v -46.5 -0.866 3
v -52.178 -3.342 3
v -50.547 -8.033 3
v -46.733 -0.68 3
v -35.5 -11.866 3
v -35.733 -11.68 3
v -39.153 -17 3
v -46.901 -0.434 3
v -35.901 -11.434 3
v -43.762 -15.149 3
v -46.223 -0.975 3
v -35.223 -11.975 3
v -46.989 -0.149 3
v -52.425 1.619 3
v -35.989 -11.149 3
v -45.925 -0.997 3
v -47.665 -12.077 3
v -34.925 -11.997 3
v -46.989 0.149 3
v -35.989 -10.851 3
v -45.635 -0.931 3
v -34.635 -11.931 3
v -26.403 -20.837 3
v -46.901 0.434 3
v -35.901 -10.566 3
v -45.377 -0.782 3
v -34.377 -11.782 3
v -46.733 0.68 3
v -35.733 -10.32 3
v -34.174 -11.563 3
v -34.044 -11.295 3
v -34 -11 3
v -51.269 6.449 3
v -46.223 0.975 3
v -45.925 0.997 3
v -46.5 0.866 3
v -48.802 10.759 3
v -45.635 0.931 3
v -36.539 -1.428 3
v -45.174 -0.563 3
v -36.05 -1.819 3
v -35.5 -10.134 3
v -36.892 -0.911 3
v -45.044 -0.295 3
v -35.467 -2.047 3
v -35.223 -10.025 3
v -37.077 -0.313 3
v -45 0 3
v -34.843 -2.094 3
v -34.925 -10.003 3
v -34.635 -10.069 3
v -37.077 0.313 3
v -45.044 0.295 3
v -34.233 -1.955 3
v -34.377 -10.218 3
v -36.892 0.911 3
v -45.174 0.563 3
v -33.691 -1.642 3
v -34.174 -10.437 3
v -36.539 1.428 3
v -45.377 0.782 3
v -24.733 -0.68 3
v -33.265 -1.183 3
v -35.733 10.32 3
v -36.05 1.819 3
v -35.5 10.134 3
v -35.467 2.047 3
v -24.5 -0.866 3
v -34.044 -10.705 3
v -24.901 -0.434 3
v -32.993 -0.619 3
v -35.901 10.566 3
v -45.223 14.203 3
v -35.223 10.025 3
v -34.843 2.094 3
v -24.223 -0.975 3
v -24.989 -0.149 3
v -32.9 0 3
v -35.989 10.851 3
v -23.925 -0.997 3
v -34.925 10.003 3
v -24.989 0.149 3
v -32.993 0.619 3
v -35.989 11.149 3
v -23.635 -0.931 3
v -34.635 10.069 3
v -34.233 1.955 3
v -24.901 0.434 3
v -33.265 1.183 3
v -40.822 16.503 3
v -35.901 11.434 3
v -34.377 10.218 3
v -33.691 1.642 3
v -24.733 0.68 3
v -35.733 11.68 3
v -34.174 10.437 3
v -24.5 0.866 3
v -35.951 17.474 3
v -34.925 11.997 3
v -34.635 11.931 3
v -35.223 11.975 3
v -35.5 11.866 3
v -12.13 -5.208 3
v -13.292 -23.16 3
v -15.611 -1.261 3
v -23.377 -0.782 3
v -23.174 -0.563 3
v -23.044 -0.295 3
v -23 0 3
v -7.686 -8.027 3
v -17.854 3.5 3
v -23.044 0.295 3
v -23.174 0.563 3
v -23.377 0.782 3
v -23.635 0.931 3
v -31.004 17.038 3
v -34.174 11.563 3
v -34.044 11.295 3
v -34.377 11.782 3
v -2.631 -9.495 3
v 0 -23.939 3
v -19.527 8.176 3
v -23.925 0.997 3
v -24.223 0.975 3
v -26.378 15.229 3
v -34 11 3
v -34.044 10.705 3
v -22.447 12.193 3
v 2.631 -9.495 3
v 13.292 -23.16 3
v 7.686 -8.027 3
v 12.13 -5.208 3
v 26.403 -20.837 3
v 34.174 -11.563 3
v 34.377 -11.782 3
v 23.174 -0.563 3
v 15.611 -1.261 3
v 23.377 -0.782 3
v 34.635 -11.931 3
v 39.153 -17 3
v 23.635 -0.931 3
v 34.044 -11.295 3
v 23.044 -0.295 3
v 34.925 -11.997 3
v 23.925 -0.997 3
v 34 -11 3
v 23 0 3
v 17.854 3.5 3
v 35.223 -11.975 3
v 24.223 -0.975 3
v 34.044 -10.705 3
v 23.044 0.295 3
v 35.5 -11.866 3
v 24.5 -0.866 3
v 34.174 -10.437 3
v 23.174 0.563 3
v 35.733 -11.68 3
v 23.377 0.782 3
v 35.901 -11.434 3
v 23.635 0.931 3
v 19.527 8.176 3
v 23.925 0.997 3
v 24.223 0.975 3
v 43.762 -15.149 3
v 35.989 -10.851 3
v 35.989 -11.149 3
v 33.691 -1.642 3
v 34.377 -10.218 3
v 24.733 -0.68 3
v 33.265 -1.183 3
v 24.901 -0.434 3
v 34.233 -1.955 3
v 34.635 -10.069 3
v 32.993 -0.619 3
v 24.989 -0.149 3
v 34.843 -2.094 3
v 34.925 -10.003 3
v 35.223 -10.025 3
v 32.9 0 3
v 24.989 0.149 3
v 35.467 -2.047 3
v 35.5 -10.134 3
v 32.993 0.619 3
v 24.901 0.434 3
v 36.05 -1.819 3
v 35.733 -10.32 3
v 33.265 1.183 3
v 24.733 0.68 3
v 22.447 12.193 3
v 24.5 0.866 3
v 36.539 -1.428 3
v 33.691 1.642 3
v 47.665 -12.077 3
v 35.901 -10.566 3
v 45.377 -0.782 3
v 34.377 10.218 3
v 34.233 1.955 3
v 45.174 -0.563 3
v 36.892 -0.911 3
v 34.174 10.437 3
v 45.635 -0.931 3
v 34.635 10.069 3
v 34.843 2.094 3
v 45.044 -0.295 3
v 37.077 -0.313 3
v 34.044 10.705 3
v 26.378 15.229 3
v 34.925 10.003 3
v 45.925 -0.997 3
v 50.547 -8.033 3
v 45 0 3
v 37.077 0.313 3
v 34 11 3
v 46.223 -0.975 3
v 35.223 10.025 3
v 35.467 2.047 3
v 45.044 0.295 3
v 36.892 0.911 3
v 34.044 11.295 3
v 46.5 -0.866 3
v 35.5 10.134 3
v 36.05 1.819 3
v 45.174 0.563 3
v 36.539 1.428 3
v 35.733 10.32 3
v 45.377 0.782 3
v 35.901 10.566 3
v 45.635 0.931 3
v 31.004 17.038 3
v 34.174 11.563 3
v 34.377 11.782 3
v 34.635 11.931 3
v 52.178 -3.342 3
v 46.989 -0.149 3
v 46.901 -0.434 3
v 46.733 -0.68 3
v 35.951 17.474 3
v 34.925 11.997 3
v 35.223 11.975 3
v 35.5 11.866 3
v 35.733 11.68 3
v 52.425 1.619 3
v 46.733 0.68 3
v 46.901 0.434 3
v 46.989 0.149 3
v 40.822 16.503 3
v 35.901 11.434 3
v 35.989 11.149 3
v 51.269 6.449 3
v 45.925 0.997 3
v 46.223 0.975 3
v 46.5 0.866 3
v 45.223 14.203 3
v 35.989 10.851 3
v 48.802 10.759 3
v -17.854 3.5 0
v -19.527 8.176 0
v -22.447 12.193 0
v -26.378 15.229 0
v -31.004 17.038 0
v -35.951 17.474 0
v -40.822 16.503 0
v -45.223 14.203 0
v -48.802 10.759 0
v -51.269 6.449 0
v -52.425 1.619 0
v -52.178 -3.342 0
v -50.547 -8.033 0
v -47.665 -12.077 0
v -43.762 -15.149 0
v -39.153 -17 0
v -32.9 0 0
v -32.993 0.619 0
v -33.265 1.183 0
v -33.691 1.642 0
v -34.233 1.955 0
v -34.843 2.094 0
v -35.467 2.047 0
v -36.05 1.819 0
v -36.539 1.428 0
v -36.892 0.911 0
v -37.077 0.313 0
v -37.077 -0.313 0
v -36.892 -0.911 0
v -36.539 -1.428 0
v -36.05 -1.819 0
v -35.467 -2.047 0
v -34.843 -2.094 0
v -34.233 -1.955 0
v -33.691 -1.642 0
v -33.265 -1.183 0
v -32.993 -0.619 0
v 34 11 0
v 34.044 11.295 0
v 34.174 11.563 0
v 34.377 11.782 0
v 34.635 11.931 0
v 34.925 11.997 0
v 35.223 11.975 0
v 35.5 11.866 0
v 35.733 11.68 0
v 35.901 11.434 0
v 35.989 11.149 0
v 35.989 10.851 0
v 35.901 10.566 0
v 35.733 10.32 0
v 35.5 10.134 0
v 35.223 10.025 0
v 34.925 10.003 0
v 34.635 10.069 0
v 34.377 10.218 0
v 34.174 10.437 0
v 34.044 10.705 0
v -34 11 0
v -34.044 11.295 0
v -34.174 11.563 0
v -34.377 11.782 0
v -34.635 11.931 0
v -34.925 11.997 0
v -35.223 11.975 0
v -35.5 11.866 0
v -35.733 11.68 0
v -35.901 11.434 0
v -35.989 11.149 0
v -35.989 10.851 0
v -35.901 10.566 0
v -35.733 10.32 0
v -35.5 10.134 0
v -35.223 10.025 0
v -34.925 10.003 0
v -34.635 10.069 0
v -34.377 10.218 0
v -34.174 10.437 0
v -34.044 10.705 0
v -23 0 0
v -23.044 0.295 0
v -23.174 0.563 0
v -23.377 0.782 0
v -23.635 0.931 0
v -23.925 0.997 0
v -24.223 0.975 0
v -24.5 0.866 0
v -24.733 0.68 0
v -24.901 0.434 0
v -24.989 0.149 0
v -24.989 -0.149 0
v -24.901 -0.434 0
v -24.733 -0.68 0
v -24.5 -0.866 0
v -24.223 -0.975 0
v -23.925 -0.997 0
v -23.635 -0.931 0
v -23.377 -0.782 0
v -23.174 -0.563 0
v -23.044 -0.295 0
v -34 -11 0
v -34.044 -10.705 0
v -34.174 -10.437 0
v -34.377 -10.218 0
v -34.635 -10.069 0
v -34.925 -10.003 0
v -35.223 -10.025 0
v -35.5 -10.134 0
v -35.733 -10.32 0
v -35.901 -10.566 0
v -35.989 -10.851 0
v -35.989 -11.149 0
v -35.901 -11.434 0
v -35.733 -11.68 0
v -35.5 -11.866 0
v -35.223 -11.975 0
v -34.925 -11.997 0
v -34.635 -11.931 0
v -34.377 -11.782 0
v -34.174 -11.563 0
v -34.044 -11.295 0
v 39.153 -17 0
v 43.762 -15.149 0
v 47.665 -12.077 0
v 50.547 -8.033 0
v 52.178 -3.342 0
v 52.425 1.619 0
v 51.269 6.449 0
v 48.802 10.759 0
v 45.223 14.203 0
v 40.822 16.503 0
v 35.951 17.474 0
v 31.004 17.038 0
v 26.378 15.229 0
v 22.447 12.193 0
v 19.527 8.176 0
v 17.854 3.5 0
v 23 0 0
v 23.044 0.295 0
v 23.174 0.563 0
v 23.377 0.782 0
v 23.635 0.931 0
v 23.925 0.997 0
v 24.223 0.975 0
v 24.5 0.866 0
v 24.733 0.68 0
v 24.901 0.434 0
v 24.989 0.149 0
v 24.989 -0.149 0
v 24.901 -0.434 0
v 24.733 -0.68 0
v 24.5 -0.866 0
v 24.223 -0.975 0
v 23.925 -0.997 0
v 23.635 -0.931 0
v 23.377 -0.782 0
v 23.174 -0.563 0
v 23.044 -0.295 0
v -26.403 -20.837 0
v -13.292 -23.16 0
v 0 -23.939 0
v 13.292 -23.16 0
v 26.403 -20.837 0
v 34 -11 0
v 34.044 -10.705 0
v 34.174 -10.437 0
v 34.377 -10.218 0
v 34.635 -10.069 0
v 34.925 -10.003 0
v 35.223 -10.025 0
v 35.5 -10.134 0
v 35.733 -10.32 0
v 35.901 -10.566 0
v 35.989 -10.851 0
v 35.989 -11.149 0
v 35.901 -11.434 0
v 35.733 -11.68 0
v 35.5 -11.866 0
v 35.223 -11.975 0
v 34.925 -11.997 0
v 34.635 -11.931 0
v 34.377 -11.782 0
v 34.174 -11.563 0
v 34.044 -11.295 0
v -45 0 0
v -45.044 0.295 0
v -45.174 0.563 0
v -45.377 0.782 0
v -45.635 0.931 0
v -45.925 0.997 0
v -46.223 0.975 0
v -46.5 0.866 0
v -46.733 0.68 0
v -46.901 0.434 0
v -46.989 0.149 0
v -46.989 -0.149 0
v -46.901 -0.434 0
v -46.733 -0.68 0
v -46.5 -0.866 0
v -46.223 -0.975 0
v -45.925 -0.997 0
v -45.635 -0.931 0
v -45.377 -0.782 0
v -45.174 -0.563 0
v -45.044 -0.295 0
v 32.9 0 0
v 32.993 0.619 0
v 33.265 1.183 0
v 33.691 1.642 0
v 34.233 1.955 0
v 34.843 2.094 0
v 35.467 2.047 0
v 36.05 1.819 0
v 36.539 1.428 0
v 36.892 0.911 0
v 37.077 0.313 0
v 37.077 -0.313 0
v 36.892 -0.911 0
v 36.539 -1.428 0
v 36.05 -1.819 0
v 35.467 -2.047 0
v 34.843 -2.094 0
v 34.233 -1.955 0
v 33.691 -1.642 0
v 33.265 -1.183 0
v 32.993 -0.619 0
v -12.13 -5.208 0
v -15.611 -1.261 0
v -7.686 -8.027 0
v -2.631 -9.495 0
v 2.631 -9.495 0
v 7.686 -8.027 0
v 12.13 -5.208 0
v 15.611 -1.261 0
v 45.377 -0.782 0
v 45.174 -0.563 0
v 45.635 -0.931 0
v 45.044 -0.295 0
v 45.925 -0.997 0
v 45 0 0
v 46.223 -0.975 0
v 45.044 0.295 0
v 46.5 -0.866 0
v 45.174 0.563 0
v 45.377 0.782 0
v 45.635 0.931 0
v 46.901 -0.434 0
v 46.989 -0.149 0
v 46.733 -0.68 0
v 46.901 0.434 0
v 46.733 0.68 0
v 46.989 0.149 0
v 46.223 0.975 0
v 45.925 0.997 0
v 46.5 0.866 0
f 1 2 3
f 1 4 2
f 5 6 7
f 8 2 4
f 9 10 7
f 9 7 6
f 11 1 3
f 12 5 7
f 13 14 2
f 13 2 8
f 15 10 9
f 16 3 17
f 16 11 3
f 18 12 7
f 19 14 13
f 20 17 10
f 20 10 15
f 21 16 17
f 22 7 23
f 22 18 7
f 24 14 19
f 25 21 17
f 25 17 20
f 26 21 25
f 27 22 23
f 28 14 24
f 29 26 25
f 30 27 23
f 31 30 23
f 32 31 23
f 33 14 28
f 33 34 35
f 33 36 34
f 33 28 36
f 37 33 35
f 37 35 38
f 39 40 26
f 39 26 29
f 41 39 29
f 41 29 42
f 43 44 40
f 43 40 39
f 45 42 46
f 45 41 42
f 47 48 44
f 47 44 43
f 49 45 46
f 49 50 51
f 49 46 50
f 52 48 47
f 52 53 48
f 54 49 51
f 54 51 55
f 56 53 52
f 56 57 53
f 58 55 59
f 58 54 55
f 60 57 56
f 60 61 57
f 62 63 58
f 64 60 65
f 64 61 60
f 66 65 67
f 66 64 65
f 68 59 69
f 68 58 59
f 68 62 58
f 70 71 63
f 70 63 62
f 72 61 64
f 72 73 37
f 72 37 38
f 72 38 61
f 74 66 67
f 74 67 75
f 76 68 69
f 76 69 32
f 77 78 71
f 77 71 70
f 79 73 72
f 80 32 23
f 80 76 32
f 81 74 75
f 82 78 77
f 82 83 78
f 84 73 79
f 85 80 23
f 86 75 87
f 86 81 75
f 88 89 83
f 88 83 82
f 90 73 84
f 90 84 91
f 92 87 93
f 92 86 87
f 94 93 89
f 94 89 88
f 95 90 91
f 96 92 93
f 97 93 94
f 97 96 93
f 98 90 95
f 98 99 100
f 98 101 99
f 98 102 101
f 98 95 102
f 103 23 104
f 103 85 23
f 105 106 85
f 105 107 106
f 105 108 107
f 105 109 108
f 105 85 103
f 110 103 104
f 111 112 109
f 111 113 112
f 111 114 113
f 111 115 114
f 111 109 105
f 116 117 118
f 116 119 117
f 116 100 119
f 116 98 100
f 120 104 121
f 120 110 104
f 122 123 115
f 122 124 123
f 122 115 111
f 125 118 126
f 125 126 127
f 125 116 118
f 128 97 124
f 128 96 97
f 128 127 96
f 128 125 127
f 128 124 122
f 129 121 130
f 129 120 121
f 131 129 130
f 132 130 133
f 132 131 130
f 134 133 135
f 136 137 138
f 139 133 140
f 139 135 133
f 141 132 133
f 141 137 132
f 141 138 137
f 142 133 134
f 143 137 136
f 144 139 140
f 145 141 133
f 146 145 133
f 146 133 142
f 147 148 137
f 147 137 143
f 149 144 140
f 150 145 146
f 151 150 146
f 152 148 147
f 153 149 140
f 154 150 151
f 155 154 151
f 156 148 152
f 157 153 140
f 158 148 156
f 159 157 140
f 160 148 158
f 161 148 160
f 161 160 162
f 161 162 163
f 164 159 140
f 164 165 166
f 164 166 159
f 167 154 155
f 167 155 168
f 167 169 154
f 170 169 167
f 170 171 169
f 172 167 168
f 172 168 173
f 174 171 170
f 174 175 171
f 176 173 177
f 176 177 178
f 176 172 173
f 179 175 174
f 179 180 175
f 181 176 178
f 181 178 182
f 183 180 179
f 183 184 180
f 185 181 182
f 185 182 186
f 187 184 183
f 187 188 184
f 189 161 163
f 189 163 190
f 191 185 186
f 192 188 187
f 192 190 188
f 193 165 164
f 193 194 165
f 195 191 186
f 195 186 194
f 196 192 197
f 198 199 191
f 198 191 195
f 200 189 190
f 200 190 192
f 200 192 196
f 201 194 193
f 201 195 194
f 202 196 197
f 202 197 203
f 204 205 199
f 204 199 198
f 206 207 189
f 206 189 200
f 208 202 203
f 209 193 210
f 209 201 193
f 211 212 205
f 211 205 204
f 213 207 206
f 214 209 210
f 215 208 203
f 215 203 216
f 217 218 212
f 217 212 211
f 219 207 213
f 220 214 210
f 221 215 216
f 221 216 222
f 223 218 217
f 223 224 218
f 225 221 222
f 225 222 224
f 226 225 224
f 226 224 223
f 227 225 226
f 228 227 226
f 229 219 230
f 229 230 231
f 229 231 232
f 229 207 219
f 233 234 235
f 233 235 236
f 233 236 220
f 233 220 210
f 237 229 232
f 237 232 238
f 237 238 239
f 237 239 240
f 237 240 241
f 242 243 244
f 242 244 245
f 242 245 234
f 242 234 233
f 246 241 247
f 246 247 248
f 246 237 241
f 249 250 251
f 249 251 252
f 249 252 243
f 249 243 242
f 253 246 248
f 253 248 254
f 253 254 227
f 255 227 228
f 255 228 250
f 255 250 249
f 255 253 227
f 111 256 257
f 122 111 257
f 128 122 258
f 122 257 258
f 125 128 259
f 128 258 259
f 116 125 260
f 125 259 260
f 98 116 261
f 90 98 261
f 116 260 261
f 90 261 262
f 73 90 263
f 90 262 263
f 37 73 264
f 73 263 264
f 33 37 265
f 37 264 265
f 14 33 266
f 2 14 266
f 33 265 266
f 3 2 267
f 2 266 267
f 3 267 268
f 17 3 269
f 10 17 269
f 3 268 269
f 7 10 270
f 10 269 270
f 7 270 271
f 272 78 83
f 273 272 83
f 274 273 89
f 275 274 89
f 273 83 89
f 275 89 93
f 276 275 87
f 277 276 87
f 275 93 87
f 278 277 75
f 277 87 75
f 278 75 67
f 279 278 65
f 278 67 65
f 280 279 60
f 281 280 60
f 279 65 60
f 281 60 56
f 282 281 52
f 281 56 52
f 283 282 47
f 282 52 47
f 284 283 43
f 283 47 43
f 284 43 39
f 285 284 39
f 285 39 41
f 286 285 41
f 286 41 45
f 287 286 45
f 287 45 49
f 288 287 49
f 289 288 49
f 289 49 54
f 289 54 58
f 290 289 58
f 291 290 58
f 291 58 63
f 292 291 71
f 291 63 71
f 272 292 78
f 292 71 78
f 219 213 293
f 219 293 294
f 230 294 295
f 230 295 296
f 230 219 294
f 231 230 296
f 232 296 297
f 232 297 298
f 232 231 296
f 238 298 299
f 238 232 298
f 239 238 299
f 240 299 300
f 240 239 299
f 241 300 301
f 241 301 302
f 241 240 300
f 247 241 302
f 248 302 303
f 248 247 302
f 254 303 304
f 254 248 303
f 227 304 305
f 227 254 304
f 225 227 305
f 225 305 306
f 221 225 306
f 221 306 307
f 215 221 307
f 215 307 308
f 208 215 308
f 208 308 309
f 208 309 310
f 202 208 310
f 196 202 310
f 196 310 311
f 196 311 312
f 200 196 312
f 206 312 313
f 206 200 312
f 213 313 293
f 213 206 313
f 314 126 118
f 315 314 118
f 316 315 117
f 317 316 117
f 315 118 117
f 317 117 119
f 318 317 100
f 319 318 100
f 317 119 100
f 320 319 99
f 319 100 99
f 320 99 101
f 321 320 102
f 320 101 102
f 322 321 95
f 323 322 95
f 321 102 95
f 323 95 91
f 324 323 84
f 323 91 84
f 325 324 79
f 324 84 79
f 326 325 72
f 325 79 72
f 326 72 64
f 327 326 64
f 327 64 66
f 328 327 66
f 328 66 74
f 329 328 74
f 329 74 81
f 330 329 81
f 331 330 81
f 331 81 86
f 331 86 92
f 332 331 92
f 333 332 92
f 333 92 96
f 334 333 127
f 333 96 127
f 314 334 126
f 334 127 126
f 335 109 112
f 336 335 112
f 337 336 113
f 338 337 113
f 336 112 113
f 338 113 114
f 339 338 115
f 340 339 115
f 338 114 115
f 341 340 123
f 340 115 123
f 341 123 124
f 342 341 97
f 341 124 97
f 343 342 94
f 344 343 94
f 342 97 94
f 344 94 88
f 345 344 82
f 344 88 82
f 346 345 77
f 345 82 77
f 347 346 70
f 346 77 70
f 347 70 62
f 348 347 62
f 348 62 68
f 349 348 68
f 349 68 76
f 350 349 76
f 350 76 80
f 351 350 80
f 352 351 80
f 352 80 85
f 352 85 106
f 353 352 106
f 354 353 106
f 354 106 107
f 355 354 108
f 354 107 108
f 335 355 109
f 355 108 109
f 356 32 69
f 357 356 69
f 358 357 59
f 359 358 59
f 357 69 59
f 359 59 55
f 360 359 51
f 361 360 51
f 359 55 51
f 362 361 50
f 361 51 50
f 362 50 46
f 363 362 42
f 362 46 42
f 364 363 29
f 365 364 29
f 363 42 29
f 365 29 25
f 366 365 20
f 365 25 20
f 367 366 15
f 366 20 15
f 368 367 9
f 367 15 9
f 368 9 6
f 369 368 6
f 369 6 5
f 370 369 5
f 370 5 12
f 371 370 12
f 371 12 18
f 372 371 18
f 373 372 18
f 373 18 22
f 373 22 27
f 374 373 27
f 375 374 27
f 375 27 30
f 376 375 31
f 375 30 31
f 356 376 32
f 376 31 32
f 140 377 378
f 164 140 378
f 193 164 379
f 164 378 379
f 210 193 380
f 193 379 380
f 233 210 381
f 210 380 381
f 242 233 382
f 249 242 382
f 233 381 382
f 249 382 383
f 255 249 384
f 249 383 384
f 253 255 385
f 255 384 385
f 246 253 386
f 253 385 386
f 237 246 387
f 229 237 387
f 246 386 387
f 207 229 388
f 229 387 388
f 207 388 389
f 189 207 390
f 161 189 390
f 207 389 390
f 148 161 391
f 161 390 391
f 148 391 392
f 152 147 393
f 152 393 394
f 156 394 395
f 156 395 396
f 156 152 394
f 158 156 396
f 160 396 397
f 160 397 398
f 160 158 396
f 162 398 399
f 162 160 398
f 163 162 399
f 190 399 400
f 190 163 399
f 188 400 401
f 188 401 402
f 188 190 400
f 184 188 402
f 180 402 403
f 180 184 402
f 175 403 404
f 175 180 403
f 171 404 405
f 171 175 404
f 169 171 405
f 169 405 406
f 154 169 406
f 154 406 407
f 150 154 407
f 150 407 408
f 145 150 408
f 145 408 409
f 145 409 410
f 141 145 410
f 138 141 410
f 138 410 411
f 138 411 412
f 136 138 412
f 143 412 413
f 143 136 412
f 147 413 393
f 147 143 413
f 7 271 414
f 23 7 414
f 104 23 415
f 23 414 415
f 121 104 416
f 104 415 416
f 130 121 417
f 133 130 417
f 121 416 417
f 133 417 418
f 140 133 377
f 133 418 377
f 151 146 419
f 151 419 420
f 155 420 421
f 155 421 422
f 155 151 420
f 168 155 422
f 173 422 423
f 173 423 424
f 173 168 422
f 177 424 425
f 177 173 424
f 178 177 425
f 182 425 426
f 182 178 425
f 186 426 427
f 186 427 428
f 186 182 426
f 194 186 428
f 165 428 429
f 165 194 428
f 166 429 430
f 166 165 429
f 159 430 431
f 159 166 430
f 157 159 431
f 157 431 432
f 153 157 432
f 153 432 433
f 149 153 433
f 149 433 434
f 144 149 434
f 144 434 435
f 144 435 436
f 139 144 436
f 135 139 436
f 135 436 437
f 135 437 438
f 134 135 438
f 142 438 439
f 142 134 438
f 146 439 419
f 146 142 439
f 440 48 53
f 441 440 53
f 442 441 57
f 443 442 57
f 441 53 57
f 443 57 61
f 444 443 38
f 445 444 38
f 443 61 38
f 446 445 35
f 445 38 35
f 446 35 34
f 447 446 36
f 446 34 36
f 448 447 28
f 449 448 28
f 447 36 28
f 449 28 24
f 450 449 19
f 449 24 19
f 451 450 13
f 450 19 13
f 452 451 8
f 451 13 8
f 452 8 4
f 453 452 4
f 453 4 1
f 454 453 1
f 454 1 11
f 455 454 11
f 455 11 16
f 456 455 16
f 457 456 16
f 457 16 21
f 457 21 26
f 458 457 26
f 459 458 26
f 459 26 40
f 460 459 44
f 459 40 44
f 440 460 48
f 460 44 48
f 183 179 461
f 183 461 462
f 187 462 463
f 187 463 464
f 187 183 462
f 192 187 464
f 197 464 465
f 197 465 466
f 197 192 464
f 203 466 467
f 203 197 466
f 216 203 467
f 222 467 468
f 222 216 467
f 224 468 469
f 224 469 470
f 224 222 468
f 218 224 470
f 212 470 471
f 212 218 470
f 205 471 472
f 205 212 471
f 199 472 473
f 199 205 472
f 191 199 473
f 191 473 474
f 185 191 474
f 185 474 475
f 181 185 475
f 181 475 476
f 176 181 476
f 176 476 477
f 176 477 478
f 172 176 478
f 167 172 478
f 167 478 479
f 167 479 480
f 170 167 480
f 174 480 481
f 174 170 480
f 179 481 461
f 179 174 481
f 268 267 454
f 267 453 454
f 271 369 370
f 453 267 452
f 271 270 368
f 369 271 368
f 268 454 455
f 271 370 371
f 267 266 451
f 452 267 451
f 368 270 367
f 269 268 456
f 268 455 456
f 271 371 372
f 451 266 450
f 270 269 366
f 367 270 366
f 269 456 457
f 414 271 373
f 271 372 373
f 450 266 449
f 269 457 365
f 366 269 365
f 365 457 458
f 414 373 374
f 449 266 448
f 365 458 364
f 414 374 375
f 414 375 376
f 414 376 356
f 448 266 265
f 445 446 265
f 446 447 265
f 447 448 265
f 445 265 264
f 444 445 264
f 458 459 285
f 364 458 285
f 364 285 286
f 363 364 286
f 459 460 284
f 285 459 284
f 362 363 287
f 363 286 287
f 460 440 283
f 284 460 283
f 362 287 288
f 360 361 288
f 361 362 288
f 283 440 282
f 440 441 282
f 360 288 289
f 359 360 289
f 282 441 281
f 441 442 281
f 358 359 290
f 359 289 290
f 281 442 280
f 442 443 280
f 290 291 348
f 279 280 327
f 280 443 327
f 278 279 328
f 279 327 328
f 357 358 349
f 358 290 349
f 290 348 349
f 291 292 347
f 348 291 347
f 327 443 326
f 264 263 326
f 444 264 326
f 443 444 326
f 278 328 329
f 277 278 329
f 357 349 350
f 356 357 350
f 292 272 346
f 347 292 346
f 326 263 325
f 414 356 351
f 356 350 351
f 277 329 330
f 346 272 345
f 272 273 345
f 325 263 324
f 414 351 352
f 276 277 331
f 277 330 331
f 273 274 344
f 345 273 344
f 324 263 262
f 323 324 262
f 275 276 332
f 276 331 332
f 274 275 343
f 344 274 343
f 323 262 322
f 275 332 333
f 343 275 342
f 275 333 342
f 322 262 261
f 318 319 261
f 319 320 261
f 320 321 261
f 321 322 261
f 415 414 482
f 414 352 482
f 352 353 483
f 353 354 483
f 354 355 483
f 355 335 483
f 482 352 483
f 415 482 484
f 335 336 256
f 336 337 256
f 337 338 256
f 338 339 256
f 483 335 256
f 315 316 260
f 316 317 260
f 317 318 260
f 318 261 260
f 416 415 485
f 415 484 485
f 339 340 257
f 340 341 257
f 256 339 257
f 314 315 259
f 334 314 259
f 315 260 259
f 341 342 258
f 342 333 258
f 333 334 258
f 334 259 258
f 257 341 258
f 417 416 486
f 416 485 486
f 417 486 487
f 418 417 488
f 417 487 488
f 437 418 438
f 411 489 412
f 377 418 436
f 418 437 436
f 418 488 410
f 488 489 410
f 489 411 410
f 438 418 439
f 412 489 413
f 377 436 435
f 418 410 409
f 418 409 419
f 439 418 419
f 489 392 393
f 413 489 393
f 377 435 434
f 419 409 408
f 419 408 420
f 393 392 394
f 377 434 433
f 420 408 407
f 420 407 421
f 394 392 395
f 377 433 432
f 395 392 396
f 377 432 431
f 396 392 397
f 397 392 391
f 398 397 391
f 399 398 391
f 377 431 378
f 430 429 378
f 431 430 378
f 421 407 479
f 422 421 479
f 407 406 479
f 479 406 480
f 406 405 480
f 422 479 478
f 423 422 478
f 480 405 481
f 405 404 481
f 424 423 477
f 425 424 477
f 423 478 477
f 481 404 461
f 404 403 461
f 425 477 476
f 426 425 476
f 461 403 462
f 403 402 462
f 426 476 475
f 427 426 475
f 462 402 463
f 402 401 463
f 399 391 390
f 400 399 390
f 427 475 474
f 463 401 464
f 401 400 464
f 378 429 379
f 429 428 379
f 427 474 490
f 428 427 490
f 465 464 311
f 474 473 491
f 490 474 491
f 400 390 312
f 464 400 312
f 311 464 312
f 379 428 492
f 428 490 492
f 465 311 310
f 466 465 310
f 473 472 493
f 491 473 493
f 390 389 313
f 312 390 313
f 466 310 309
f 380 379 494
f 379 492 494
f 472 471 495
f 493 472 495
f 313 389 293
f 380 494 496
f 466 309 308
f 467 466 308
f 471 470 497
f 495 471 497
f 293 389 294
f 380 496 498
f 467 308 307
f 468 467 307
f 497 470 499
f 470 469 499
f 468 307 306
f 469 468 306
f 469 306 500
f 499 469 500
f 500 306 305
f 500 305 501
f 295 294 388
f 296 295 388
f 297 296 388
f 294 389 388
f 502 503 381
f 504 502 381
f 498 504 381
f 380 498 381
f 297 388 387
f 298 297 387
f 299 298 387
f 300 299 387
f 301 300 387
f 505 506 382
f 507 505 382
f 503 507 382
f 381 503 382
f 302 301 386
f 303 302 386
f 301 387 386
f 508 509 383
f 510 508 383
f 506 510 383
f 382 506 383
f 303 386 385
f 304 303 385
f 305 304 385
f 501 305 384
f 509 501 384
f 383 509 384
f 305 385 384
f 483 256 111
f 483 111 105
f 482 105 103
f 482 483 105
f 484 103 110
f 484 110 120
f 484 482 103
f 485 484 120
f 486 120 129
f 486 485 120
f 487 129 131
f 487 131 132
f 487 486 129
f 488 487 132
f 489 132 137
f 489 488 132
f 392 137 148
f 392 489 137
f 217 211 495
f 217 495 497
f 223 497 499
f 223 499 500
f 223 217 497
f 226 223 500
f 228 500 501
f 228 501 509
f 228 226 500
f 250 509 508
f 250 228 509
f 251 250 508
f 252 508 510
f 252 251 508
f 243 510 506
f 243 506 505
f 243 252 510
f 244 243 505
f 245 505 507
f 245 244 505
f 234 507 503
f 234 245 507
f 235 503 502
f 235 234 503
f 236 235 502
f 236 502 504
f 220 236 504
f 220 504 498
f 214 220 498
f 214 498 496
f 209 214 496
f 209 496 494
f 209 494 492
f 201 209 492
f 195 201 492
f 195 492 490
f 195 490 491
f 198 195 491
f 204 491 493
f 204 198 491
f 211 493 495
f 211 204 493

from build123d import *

# Parameters (mm, degrees)
PAD_DEPTH     = 3
SKETCH001_R   = 1
SKETCH001_R_2 = 2.1
POCKET_DEPTH  = 3


with BuildPart() as part:
    # Sketch → Pad (new body)
    with BuildSketch(Plane.XY):
        with BuildLine():
            ThreePointArc((-39.153312, -17), (0, -23.9385), (39.153312, -17))
            ThreePointArc((39.153312, -17), (47.135393, 12.608816), (17.853572, 3.5))
            ThreePointArc((-17.853572, 3.5), (0, -9.681542), (17.853572, 3.5))
            ThreePointArc((-17.853572, 3.5), (-47.135393, 12.608816), (-39.153312, -17))
        make_face()
    extrude(amount=PAD_DEPTH)

    # Sketch001 (on Face6 of Pad) → Pocket (cut)
    with BuildSketch(Plane.XY.offset(3)):
        with Locations((-35, 11)):
            Circle(SKETCH001_R)
        with Locations((-35, -11)):
            Circle(SKETCH001_R)
        with Locations((-46, 0)):
            Circle(SKETCH001_R)
        with Locations((-24, 0)):
            Circle(SKETCH001_R)
        with Locations((-35, 0)):
            Circle(SKETCH001_R_2)
    pocket = extrude(amount=-POCKET_DEPTH, mode=Mode.SUBTRACT)

    # Mirrored: Pocket across Sketch001 V_Axis
    add(pocket.mirror(Plane(origin=(0, 0, 3), x_dir=(0, 0, 1), z_dir=(1, 0, 0))), mode=Mode.SUBTRACT)


solid = part.part
